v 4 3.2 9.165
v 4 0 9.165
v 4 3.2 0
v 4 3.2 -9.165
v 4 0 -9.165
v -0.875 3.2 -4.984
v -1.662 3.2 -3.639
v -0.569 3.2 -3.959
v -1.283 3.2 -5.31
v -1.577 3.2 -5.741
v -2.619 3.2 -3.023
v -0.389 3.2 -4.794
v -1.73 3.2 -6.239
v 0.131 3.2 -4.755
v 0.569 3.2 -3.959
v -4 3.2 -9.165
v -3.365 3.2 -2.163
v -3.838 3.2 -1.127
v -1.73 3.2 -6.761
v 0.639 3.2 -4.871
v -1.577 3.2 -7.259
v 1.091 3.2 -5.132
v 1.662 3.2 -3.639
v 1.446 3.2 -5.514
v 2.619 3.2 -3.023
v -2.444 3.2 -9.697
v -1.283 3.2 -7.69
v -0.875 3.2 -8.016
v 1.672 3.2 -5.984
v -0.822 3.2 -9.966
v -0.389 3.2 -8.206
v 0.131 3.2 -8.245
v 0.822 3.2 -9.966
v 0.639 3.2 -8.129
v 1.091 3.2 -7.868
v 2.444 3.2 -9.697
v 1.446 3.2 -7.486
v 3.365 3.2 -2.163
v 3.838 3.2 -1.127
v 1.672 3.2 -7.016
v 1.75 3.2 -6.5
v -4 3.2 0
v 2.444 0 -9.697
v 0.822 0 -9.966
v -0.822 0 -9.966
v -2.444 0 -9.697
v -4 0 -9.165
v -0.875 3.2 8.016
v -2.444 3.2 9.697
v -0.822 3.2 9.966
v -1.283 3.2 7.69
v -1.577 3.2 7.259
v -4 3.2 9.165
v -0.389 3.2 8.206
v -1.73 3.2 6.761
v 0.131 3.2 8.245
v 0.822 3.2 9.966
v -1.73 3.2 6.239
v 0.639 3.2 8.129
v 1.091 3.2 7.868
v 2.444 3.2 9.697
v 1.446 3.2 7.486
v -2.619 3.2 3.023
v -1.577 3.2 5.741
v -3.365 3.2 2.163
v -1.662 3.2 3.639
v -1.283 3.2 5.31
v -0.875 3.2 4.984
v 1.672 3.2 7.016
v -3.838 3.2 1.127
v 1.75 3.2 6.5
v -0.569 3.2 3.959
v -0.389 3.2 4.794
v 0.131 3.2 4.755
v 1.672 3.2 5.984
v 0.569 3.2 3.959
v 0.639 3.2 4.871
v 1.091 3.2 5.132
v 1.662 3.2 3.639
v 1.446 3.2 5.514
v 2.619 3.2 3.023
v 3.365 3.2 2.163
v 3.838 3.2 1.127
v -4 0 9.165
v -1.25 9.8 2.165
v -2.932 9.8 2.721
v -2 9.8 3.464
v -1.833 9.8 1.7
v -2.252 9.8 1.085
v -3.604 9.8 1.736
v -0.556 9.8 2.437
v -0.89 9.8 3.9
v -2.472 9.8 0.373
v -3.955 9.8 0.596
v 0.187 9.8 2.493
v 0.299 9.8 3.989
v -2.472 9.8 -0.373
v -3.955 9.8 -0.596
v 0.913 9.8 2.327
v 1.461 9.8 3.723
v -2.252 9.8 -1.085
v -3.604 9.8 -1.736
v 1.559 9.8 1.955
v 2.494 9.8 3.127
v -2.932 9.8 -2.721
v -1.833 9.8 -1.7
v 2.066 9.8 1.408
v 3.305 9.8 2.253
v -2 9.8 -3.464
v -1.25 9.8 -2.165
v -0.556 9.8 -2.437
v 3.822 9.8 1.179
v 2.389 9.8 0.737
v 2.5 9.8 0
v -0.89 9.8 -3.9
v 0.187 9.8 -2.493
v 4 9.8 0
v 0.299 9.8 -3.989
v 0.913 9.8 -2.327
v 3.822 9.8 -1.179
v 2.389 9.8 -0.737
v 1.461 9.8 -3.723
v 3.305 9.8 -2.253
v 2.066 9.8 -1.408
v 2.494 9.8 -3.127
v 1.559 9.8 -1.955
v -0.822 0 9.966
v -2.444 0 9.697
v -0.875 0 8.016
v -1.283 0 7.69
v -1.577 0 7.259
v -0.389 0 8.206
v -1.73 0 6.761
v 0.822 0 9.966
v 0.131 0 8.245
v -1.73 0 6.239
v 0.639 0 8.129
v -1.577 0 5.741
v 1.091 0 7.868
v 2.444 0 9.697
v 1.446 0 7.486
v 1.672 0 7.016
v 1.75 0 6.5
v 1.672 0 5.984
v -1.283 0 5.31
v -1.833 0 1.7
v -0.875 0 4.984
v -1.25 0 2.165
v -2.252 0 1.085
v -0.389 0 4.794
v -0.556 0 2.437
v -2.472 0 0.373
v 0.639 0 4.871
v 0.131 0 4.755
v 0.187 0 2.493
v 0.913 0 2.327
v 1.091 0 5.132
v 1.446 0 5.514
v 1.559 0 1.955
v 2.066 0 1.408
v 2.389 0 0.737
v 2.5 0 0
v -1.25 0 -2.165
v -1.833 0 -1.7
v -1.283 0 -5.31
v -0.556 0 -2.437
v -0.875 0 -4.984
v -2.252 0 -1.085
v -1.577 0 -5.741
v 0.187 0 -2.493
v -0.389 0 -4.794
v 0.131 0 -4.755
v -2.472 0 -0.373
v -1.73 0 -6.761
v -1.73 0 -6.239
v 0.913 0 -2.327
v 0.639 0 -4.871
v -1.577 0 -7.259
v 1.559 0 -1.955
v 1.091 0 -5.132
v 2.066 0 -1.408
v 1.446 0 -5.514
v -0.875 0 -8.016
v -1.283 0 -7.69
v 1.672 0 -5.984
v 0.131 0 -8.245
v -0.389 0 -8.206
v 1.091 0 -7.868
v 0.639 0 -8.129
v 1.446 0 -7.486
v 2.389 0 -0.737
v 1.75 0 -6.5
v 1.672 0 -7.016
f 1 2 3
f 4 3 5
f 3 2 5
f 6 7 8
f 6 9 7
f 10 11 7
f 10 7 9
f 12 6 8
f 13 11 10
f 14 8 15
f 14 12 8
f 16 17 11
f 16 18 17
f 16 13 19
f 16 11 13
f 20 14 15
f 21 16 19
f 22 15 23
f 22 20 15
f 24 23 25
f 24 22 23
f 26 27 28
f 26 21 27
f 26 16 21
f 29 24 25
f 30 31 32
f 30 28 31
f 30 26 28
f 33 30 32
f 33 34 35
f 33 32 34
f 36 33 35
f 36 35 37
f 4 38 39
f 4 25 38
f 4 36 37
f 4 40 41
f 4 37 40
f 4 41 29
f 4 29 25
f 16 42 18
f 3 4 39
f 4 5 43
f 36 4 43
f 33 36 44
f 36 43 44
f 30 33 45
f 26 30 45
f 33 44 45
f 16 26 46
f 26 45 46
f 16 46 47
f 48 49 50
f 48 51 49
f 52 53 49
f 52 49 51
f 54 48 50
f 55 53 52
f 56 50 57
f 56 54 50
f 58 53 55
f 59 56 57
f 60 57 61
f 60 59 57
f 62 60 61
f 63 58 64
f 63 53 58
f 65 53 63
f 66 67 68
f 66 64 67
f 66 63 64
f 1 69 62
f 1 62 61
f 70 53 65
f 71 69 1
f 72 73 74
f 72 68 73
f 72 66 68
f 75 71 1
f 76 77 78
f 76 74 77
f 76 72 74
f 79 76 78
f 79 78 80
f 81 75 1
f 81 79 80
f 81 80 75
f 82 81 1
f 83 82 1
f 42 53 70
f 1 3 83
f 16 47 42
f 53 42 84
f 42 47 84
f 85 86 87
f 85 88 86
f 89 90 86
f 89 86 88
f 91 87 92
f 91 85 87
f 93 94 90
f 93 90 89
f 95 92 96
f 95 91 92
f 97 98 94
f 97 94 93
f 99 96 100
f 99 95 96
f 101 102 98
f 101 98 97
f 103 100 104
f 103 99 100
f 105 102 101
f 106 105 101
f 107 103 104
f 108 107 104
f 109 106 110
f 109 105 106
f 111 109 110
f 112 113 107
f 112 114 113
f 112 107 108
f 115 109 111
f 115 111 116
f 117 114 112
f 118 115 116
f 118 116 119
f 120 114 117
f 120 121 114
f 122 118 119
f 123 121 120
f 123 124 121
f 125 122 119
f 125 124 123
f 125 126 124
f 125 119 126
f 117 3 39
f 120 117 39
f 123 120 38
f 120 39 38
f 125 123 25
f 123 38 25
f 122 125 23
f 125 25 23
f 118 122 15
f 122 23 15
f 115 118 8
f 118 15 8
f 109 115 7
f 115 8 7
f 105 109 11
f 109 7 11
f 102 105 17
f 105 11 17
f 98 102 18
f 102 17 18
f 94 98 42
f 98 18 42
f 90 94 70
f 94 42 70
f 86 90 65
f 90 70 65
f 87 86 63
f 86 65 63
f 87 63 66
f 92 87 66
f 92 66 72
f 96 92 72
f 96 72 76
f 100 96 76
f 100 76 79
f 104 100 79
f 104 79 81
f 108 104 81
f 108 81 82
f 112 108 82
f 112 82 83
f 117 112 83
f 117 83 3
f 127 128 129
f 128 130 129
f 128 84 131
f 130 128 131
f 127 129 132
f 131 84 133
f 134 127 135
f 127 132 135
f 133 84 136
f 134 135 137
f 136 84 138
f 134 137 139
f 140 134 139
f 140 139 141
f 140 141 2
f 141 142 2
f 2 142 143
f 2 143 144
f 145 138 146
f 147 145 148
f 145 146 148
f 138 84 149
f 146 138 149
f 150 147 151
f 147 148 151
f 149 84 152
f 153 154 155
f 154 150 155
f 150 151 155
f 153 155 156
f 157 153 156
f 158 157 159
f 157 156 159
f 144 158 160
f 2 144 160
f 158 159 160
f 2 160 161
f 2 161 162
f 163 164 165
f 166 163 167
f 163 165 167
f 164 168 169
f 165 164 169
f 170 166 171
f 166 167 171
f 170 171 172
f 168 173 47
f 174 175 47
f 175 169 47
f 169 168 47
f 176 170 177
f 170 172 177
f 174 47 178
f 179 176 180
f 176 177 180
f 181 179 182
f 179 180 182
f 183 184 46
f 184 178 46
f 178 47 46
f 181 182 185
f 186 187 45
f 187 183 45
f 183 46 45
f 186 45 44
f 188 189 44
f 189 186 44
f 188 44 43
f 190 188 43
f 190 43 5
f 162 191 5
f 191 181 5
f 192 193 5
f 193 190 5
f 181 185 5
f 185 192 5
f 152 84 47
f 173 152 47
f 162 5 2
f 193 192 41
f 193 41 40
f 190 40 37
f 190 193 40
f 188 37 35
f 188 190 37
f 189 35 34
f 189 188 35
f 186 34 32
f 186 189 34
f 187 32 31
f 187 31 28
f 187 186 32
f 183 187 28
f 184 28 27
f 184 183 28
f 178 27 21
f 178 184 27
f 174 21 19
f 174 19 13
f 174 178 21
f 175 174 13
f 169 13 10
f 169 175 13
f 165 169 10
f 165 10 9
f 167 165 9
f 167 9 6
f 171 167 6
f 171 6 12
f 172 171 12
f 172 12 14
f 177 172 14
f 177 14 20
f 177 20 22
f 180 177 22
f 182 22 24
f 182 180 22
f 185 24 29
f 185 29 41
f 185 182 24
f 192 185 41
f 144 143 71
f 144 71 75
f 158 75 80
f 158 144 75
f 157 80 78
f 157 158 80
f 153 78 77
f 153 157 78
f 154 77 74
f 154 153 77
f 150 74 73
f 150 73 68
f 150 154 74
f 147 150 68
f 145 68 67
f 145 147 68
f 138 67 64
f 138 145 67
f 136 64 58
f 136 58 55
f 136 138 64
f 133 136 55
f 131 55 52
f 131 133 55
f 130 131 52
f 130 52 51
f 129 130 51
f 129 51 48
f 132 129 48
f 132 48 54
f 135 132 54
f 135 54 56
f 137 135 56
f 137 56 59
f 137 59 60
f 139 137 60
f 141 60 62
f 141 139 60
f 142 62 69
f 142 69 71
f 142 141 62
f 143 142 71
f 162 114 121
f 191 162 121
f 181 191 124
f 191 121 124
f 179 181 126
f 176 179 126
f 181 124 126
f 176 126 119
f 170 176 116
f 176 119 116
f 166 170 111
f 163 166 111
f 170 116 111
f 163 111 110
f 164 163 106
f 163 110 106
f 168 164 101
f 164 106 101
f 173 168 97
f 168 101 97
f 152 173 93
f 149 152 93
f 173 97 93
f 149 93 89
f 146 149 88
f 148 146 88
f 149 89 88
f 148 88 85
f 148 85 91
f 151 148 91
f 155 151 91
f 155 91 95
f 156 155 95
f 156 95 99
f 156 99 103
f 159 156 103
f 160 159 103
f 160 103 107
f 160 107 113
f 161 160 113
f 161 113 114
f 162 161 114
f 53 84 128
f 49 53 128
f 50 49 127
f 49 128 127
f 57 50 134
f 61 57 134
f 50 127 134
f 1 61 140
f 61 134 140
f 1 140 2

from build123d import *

# Parameters (mm, degrees)
SKETCH_2_R          = 1.75
EXTRUDE_1_DEPTH     = 3.2
SKETCH_3_R          = 4
EXTRUDE_2_DEPTH     = 6.6
SKETCH_4_R          = 2.5
CUT_EXTRUDE_1_DEPTH = 10.8


with BuildPart() as part:
    # 草图2 → 凸台-拉伸1 (new body)
    with BuildSketch(Plane(origin=(0, 0, 0), x_dir=(1, 0, 0), z_dir=(0, 1, 0))):
        with BuildLine():
            Line((-4, 9.16515139), (-4, -9.16515139))
            ThreePointArc((-4, -9.16515139), (0, -10), (4, -9.16515139))
            Line((4, -9.16515139), (4, 9.16515139))
            ThreePointArc((4, 9.16515139), (0, 10), (-4, 9.16515139))
        make_face()
        with Locations((0, 6.5)):
            Circle(SKETCH_2_R, mode=Mode.SUBTRACT)
        with Locations((0, -6.5)):
            Circle(SKETCH_2_R, mode=Mode.SUBTRACT)
    extrude(amount=EXTRUDE_1_DEPTH)

    # 草图3 → 凸台-拉伸2 (add)
    with BuildSketch(Plane(origin=(0, 3.2, 0), x_dir=(1, 0, 0), z_dir=(0, 1, 0))):
        Circle(SKETCH_3_R)
    extrude(amount=EXTRUDE_2_DEPTH)

    # 草图4 → 切除-拉伸1 (cut, through all)
    with BuildSketch(Plane(origin=(0, 9.8, 0), x_dir=(1, 0, 0), z_dir=(0, 1, 0))):
        Circle(SKETCH_4_R)
    extrude(amount=-CUT_EXTRUDE_1_DEPTH, mode=Mode.SUBTRACT)


solid = part.part
